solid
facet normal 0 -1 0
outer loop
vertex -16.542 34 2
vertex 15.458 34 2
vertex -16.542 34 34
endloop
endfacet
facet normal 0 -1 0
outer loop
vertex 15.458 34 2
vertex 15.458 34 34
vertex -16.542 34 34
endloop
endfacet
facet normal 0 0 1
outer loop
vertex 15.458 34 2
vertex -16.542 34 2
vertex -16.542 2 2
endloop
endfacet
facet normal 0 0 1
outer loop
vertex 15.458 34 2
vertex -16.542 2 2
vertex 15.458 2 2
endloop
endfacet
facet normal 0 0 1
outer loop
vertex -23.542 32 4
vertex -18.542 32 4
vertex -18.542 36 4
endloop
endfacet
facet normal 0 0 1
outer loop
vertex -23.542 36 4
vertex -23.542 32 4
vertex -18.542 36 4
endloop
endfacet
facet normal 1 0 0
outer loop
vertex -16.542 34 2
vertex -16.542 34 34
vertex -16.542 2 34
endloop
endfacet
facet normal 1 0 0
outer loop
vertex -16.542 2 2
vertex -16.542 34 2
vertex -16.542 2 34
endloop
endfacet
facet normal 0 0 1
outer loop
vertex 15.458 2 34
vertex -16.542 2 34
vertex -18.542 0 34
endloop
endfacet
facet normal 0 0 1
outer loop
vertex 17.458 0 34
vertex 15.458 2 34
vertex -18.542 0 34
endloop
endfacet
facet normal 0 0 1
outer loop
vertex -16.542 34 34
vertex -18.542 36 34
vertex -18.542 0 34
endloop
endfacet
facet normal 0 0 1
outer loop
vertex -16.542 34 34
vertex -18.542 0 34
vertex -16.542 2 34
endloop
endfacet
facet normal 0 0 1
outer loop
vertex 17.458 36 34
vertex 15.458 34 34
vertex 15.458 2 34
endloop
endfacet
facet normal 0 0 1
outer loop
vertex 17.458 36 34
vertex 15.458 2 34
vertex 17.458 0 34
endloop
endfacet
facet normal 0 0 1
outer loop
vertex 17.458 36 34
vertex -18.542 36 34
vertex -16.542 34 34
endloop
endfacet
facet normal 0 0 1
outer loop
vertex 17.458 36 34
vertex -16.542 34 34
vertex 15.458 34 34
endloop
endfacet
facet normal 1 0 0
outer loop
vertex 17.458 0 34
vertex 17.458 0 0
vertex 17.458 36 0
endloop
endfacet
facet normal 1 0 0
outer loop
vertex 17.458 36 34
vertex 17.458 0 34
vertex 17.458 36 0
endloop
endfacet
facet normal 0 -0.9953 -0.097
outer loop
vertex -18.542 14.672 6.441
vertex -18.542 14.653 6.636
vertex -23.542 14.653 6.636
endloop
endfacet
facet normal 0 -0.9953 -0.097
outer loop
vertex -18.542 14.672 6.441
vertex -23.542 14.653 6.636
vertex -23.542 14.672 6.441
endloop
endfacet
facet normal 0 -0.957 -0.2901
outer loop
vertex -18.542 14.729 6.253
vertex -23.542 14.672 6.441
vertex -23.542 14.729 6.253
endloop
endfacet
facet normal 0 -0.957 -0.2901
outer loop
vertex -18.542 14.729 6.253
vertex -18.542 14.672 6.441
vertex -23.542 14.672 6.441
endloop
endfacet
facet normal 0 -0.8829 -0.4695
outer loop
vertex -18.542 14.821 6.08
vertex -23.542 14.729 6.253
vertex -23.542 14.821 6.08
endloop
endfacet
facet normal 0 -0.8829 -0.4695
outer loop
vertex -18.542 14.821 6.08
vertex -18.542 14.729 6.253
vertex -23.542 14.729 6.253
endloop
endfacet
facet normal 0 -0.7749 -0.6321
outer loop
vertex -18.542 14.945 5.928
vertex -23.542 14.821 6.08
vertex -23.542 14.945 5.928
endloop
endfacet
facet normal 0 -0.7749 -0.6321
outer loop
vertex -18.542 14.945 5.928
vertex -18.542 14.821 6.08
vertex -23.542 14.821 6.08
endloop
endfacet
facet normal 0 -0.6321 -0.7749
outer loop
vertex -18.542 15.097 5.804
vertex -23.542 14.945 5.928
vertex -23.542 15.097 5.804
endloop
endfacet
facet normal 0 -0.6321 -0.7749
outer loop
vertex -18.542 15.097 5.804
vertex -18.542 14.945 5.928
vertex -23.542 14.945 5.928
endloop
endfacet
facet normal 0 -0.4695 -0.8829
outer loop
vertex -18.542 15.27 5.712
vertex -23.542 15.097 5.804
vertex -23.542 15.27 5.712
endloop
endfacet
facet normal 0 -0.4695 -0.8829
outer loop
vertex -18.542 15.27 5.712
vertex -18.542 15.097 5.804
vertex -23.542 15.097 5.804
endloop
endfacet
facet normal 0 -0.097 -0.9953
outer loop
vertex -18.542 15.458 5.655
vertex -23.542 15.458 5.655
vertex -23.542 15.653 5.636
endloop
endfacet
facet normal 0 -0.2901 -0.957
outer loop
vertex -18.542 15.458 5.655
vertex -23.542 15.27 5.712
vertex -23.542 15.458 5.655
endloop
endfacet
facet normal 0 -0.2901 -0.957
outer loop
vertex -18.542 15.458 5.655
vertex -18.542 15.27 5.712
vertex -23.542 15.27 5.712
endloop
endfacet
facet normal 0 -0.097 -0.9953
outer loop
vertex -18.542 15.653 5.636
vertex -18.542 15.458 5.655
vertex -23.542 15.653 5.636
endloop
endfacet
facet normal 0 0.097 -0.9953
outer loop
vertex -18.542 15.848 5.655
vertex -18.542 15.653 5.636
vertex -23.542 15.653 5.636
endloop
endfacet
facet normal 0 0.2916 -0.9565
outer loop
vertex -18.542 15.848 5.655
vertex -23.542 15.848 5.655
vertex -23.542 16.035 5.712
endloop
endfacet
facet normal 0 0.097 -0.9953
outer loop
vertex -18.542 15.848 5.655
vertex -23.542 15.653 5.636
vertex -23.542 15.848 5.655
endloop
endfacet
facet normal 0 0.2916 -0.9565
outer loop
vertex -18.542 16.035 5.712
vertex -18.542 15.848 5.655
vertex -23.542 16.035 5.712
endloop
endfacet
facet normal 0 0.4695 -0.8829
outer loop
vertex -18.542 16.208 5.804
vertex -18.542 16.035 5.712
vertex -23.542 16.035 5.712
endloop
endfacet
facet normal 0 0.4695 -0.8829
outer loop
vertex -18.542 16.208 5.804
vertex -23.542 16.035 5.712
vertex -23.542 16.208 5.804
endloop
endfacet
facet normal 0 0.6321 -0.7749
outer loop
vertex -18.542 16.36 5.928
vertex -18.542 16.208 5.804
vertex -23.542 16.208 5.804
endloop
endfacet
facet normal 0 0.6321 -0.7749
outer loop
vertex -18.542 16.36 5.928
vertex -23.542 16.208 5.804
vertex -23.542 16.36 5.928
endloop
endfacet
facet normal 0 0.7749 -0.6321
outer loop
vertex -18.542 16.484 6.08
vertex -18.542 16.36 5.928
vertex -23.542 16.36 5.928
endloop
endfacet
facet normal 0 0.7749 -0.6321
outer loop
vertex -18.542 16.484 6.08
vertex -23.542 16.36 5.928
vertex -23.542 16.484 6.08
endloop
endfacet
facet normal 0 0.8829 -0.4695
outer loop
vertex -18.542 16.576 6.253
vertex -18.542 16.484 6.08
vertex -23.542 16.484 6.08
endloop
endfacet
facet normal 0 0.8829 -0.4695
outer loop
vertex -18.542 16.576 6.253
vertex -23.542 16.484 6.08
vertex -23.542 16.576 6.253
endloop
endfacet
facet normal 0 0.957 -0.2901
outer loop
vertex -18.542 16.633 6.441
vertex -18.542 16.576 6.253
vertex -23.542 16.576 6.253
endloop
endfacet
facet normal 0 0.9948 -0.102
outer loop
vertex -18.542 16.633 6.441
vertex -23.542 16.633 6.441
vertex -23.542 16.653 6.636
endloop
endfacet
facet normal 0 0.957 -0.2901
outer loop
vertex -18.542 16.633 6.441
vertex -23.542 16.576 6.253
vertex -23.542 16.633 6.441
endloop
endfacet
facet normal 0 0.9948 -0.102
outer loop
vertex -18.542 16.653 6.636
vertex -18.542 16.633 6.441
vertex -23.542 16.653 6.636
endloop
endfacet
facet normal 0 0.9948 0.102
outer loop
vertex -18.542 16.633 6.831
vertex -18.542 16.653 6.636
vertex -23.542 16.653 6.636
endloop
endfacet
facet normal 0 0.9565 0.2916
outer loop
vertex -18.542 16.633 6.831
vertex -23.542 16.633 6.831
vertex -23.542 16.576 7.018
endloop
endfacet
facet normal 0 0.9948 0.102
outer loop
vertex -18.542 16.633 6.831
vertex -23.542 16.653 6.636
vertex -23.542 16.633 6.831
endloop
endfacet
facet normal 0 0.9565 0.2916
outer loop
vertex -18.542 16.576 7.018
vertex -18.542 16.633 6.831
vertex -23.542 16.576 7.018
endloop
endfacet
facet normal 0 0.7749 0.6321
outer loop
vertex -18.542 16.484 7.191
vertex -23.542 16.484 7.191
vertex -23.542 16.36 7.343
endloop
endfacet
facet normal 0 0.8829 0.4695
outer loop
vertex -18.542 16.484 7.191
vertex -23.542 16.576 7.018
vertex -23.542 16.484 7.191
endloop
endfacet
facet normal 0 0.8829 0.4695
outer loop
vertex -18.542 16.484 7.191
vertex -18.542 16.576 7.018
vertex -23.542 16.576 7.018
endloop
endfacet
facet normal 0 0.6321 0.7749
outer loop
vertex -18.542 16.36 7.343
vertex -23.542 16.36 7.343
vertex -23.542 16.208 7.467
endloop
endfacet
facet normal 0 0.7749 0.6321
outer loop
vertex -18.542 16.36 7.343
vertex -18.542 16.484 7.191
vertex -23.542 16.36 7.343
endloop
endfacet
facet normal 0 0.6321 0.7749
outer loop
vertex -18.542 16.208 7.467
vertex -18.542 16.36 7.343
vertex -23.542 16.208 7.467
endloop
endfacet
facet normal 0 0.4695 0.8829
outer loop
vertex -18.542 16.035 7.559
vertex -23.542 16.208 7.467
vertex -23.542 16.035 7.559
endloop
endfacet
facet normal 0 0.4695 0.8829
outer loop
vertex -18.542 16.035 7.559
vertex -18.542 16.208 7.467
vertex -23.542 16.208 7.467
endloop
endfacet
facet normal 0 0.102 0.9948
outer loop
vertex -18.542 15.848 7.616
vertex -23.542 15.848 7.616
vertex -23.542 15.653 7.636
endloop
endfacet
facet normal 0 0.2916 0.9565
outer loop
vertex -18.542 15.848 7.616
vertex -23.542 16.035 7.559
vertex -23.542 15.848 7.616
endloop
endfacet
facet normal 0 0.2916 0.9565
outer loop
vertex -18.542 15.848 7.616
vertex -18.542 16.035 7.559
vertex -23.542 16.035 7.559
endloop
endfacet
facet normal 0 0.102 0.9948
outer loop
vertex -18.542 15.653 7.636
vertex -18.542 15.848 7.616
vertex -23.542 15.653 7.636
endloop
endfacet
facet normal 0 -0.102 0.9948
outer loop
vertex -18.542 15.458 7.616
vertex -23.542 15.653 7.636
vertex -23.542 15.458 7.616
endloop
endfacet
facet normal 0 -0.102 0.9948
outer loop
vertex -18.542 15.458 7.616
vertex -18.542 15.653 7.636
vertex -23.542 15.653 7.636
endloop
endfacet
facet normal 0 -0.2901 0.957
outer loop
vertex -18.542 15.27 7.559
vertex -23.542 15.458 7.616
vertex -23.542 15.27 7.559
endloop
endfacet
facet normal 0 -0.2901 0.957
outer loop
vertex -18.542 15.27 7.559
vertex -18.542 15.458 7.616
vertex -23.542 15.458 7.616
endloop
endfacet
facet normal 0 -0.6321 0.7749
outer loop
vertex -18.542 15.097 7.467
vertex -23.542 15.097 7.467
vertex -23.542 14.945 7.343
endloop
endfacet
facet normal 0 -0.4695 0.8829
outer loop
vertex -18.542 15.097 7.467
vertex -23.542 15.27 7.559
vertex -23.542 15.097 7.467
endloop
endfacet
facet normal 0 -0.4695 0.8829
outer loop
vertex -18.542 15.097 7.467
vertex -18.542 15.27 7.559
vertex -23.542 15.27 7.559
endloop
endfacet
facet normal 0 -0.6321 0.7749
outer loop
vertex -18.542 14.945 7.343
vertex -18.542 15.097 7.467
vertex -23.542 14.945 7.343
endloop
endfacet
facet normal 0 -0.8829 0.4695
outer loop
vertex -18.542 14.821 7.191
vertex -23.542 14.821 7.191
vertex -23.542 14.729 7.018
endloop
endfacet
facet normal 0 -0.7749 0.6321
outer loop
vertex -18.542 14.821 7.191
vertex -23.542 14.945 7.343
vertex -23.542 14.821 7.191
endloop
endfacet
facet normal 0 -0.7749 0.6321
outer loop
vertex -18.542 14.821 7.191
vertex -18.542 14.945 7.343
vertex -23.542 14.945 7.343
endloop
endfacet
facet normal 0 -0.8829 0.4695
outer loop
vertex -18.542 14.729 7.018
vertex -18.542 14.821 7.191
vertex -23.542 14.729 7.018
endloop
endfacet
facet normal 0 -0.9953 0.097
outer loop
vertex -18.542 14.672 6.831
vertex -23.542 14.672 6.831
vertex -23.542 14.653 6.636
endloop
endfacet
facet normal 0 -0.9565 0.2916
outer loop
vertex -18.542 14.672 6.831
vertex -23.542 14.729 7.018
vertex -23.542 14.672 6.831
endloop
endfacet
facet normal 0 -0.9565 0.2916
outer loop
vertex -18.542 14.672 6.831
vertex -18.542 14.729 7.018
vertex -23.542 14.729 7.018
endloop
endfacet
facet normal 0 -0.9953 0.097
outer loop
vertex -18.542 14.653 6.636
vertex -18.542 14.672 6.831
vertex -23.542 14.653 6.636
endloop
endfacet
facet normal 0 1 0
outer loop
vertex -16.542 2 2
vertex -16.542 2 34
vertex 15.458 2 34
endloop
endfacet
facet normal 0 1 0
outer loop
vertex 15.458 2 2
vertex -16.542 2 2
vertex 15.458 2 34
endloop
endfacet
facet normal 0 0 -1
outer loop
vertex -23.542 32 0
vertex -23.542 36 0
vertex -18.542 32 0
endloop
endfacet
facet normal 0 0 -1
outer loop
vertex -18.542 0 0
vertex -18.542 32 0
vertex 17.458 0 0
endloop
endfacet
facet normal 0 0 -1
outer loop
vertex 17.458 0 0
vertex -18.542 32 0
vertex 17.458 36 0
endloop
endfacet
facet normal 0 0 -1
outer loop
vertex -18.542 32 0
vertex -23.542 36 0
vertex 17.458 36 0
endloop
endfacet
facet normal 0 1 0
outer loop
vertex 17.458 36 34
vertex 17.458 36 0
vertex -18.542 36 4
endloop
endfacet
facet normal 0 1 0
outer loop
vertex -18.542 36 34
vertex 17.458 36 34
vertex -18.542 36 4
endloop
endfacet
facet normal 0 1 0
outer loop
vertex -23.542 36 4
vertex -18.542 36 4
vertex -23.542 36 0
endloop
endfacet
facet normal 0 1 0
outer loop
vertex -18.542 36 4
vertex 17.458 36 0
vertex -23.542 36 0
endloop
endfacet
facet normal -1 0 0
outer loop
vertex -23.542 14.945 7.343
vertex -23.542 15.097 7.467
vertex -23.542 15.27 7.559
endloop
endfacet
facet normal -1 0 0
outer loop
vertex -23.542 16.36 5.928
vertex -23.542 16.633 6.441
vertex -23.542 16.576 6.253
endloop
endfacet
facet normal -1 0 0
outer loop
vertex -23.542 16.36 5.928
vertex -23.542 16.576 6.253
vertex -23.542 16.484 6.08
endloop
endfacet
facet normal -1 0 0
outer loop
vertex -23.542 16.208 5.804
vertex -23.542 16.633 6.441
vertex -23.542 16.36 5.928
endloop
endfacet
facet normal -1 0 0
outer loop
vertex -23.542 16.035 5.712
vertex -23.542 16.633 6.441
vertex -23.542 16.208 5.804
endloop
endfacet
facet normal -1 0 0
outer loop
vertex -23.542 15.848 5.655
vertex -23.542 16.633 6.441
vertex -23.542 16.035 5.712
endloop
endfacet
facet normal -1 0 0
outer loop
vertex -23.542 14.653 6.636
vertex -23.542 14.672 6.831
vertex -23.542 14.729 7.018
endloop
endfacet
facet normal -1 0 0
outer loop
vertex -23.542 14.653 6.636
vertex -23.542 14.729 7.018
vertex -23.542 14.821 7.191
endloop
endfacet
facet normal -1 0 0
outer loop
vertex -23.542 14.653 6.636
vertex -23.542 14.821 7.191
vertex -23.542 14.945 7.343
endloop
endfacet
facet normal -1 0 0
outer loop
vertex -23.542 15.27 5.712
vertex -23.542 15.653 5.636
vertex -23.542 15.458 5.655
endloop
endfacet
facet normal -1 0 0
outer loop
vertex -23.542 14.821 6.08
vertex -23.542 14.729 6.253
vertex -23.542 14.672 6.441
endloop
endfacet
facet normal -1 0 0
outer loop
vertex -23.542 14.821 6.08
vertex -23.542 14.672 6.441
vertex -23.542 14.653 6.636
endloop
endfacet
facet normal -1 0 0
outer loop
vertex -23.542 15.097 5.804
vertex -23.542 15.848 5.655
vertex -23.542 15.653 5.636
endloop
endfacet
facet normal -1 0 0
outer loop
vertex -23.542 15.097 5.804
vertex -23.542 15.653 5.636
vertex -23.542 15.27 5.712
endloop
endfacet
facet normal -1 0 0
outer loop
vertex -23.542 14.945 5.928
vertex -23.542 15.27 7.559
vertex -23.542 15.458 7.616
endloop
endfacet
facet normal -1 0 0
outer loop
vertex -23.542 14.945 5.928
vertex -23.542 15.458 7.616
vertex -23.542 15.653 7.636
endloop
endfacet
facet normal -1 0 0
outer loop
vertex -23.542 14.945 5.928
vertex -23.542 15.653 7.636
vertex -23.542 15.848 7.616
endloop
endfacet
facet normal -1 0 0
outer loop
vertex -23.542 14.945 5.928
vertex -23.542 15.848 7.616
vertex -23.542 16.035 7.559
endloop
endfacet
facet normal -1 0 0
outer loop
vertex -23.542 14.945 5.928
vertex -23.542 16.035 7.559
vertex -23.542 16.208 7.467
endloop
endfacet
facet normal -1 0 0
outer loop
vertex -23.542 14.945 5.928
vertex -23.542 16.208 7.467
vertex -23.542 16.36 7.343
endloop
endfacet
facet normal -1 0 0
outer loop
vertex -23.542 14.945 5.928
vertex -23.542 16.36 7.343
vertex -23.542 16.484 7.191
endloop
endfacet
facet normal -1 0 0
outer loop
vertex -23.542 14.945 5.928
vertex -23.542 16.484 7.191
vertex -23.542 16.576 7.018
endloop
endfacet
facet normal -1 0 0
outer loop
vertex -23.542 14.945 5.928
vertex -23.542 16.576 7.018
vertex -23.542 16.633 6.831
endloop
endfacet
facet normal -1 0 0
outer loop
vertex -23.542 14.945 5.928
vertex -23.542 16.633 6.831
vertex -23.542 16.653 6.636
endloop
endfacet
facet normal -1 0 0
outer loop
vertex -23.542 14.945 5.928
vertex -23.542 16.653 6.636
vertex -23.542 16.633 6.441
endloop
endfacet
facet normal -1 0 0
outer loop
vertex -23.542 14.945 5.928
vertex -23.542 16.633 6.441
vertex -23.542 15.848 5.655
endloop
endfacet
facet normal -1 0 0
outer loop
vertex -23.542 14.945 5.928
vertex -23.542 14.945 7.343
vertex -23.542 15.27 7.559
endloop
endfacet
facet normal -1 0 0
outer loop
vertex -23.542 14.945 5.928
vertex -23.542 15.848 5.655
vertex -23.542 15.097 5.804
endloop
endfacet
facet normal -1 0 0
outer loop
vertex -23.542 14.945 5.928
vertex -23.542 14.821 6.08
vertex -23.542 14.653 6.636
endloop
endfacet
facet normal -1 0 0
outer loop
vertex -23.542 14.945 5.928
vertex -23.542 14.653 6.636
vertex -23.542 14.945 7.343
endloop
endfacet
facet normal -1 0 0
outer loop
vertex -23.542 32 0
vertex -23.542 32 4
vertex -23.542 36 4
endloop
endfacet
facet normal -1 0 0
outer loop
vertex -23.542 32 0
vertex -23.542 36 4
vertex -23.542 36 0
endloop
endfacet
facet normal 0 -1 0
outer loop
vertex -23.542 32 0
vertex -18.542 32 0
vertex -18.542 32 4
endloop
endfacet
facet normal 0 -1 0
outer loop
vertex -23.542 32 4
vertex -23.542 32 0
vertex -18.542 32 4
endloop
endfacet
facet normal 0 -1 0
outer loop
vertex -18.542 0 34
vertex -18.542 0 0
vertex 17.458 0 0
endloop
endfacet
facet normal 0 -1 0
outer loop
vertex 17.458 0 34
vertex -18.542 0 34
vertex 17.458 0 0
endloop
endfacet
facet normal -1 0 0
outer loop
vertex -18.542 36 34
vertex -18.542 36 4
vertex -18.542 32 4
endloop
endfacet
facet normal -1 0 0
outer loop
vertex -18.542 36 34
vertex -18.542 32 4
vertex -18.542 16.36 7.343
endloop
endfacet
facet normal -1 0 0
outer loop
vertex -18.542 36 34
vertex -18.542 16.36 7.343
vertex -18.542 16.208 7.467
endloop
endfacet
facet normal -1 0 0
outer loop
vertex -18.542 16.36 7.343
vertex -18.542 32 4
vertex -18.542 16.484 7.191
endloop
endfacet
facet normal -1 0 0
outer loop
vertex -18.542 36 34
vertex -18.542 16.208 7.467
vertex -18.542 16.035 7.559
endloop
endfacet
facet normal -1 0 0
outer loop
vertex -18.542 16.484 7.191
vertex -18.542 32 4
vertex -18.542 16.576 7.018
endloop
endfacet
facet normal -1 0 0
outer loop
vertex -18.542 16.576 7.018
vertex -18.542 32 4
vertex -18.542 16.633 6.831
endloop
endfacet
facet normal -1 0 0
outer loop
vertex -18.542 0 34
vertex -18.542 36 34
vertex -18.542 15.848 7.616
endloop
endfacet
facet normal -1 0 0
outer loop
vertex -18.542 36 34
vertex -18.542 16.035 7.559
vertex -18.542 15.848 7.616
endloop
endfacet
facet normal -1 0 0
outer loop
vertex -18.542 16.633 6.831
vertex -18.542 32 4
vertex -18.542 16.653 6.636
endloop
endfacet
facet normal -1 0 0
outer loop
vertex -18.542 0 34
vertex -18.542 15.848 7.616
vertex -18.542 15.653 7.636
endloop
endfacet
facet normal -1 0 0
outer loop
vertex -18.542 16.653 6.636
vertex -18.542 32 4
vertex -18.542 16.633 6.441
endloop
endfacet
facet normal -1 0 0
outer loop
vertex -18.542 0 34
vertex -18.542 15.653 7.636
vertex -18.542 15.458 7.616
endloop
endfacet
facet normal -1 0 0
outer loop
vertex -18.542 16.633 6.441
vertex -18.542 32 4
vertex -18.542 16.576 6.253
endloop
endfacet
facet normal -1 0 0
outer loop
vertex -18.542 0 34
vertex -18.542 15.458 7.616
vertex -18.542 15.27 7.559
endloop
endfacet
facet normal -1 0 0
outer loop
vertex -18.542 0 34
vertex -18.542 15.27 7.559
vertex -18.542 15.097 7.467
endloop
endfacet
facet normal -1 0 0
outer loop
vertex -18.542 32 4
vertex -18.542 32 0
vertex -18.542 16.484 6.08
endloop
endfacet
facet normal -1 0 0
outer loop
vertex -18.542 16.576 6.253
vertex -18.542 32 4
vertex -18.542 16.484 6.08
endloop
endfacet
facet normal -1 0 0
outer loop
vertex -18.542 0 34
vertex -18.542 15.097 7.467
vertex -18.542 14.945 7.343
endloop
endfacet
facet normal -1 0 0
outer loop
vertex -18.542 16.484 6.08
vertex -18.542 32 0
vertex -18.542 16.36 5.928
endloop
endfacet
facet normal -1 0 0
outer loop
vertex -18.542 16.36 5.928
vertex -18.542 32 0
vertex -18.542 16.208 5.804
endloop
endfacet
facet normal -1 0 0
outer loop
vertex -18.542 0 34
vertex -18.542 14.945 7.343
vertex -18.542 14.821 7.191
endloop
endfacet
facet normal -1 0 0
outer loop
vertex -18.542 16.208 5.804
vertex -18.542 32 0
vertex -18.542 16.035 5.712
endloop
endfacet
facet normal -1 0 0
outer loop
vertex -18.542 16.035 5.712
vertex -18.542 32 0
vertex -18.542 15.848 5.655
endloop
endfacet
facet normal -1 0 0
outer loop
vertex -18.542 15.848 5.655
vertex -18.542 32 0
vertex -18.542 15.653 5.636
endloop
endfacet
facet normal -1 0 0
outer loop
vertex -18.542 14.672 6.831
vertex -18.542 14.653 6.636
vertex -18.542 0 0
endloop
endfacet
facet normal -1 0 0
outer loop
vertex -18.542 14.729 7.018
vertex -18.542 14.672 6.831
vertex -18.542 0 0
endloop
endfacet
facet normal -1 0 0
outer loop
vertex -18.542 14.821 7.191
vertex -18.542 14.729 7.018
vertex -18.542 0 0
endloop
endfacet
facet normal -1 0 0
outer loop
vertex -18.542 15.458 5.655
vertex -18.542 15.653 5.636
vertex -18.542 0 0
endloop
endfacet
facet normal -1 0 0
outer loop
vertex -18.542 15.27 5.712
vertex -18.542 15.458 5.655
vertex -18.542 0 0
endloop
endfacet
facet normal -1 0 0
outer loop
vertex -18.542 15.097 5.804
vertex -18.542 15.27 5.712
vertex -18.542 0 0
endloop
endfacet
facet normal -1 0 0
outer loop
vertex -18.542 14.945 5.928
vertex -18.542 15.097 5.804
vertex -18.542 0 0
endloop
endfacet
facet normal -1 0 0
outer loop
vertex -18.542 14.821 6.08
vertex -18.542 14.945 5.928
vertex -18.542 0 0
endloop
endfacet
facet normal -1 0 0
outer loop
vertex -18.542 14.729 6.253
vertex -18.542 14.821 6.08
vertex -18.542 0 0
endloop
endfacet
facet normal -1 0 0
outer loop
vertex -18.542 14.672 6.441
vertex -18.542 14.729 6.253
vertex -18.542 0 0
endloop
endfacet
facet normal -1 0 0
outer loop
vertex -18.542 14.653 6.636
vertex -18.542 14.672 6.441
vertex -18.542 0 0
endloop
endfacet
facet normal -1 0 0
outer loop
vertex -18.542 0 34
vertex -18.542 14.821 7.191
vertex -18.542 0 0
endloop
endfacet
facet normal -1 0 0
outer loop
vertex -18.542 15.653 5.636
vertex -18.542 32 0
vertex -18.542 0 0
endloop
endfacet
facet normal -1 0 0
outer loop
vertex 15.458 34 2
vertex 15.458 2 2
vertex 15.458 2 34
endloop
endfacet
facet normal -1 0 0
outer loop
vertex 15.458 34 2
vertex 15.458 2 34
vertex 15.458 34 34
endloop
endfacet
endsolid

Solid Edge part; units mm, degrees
sketch "Sketch1" plane through (0, 0, 0) normal (0, 0, 1) x (1, 0, 0)
  line L0 (-18.5425, 0) -> (17.4575, 0)
  line L1 (17.4575, 0) -> (17.4575, 36)
  line L2 (17.4575, 36) -> (-18.5425, 36)
  line L3 (-18.5425, 36) -> (-18.5425, 0)
extrude "Protrusion1" add sketch "Sketch1" along normal blind 34
sketch "Sketch2" plane through (-0.5425, 18, 34) normal (0, 0, 1) x (1, 0, 0)
  line L0 (-16, -16) -> (16, -16)
  line L1 (16, -16) -> (16, 16)
  line L2 (16, 16) -> (-16, 16)
  line L3 (-16, 16) -> (-16, -16)
extrude "ExtrudedCutout_1" cut sketch "Sketch2" against normal blind 32
sketch "Sketch3" plane through (-18.5425, 18, 17) normal (-1, 0, 0) x (0, -1, 0)
  line L0 (-18, -17) -> (-14, -17)
  line L1 (-14, -17) -> (-14, -13)
  line L2 (-14, -13) -> (-18, -13)
  line L3 (-18, -13) -> (-18, -17)
extrude "ExtrudedProtrusion_2" add sketch "Sketch3" along normal blind 5
sketch "Sketch4" plane through (-18.5425, 18, 17) normal (-1, 0, 0) x (0, -1, 0)
  circle A0 centre (2.3474, -10.3644) radius 1
extrude "ExtrudedProtrusion_3" add sketch "Sketch4" along normal blind 5
